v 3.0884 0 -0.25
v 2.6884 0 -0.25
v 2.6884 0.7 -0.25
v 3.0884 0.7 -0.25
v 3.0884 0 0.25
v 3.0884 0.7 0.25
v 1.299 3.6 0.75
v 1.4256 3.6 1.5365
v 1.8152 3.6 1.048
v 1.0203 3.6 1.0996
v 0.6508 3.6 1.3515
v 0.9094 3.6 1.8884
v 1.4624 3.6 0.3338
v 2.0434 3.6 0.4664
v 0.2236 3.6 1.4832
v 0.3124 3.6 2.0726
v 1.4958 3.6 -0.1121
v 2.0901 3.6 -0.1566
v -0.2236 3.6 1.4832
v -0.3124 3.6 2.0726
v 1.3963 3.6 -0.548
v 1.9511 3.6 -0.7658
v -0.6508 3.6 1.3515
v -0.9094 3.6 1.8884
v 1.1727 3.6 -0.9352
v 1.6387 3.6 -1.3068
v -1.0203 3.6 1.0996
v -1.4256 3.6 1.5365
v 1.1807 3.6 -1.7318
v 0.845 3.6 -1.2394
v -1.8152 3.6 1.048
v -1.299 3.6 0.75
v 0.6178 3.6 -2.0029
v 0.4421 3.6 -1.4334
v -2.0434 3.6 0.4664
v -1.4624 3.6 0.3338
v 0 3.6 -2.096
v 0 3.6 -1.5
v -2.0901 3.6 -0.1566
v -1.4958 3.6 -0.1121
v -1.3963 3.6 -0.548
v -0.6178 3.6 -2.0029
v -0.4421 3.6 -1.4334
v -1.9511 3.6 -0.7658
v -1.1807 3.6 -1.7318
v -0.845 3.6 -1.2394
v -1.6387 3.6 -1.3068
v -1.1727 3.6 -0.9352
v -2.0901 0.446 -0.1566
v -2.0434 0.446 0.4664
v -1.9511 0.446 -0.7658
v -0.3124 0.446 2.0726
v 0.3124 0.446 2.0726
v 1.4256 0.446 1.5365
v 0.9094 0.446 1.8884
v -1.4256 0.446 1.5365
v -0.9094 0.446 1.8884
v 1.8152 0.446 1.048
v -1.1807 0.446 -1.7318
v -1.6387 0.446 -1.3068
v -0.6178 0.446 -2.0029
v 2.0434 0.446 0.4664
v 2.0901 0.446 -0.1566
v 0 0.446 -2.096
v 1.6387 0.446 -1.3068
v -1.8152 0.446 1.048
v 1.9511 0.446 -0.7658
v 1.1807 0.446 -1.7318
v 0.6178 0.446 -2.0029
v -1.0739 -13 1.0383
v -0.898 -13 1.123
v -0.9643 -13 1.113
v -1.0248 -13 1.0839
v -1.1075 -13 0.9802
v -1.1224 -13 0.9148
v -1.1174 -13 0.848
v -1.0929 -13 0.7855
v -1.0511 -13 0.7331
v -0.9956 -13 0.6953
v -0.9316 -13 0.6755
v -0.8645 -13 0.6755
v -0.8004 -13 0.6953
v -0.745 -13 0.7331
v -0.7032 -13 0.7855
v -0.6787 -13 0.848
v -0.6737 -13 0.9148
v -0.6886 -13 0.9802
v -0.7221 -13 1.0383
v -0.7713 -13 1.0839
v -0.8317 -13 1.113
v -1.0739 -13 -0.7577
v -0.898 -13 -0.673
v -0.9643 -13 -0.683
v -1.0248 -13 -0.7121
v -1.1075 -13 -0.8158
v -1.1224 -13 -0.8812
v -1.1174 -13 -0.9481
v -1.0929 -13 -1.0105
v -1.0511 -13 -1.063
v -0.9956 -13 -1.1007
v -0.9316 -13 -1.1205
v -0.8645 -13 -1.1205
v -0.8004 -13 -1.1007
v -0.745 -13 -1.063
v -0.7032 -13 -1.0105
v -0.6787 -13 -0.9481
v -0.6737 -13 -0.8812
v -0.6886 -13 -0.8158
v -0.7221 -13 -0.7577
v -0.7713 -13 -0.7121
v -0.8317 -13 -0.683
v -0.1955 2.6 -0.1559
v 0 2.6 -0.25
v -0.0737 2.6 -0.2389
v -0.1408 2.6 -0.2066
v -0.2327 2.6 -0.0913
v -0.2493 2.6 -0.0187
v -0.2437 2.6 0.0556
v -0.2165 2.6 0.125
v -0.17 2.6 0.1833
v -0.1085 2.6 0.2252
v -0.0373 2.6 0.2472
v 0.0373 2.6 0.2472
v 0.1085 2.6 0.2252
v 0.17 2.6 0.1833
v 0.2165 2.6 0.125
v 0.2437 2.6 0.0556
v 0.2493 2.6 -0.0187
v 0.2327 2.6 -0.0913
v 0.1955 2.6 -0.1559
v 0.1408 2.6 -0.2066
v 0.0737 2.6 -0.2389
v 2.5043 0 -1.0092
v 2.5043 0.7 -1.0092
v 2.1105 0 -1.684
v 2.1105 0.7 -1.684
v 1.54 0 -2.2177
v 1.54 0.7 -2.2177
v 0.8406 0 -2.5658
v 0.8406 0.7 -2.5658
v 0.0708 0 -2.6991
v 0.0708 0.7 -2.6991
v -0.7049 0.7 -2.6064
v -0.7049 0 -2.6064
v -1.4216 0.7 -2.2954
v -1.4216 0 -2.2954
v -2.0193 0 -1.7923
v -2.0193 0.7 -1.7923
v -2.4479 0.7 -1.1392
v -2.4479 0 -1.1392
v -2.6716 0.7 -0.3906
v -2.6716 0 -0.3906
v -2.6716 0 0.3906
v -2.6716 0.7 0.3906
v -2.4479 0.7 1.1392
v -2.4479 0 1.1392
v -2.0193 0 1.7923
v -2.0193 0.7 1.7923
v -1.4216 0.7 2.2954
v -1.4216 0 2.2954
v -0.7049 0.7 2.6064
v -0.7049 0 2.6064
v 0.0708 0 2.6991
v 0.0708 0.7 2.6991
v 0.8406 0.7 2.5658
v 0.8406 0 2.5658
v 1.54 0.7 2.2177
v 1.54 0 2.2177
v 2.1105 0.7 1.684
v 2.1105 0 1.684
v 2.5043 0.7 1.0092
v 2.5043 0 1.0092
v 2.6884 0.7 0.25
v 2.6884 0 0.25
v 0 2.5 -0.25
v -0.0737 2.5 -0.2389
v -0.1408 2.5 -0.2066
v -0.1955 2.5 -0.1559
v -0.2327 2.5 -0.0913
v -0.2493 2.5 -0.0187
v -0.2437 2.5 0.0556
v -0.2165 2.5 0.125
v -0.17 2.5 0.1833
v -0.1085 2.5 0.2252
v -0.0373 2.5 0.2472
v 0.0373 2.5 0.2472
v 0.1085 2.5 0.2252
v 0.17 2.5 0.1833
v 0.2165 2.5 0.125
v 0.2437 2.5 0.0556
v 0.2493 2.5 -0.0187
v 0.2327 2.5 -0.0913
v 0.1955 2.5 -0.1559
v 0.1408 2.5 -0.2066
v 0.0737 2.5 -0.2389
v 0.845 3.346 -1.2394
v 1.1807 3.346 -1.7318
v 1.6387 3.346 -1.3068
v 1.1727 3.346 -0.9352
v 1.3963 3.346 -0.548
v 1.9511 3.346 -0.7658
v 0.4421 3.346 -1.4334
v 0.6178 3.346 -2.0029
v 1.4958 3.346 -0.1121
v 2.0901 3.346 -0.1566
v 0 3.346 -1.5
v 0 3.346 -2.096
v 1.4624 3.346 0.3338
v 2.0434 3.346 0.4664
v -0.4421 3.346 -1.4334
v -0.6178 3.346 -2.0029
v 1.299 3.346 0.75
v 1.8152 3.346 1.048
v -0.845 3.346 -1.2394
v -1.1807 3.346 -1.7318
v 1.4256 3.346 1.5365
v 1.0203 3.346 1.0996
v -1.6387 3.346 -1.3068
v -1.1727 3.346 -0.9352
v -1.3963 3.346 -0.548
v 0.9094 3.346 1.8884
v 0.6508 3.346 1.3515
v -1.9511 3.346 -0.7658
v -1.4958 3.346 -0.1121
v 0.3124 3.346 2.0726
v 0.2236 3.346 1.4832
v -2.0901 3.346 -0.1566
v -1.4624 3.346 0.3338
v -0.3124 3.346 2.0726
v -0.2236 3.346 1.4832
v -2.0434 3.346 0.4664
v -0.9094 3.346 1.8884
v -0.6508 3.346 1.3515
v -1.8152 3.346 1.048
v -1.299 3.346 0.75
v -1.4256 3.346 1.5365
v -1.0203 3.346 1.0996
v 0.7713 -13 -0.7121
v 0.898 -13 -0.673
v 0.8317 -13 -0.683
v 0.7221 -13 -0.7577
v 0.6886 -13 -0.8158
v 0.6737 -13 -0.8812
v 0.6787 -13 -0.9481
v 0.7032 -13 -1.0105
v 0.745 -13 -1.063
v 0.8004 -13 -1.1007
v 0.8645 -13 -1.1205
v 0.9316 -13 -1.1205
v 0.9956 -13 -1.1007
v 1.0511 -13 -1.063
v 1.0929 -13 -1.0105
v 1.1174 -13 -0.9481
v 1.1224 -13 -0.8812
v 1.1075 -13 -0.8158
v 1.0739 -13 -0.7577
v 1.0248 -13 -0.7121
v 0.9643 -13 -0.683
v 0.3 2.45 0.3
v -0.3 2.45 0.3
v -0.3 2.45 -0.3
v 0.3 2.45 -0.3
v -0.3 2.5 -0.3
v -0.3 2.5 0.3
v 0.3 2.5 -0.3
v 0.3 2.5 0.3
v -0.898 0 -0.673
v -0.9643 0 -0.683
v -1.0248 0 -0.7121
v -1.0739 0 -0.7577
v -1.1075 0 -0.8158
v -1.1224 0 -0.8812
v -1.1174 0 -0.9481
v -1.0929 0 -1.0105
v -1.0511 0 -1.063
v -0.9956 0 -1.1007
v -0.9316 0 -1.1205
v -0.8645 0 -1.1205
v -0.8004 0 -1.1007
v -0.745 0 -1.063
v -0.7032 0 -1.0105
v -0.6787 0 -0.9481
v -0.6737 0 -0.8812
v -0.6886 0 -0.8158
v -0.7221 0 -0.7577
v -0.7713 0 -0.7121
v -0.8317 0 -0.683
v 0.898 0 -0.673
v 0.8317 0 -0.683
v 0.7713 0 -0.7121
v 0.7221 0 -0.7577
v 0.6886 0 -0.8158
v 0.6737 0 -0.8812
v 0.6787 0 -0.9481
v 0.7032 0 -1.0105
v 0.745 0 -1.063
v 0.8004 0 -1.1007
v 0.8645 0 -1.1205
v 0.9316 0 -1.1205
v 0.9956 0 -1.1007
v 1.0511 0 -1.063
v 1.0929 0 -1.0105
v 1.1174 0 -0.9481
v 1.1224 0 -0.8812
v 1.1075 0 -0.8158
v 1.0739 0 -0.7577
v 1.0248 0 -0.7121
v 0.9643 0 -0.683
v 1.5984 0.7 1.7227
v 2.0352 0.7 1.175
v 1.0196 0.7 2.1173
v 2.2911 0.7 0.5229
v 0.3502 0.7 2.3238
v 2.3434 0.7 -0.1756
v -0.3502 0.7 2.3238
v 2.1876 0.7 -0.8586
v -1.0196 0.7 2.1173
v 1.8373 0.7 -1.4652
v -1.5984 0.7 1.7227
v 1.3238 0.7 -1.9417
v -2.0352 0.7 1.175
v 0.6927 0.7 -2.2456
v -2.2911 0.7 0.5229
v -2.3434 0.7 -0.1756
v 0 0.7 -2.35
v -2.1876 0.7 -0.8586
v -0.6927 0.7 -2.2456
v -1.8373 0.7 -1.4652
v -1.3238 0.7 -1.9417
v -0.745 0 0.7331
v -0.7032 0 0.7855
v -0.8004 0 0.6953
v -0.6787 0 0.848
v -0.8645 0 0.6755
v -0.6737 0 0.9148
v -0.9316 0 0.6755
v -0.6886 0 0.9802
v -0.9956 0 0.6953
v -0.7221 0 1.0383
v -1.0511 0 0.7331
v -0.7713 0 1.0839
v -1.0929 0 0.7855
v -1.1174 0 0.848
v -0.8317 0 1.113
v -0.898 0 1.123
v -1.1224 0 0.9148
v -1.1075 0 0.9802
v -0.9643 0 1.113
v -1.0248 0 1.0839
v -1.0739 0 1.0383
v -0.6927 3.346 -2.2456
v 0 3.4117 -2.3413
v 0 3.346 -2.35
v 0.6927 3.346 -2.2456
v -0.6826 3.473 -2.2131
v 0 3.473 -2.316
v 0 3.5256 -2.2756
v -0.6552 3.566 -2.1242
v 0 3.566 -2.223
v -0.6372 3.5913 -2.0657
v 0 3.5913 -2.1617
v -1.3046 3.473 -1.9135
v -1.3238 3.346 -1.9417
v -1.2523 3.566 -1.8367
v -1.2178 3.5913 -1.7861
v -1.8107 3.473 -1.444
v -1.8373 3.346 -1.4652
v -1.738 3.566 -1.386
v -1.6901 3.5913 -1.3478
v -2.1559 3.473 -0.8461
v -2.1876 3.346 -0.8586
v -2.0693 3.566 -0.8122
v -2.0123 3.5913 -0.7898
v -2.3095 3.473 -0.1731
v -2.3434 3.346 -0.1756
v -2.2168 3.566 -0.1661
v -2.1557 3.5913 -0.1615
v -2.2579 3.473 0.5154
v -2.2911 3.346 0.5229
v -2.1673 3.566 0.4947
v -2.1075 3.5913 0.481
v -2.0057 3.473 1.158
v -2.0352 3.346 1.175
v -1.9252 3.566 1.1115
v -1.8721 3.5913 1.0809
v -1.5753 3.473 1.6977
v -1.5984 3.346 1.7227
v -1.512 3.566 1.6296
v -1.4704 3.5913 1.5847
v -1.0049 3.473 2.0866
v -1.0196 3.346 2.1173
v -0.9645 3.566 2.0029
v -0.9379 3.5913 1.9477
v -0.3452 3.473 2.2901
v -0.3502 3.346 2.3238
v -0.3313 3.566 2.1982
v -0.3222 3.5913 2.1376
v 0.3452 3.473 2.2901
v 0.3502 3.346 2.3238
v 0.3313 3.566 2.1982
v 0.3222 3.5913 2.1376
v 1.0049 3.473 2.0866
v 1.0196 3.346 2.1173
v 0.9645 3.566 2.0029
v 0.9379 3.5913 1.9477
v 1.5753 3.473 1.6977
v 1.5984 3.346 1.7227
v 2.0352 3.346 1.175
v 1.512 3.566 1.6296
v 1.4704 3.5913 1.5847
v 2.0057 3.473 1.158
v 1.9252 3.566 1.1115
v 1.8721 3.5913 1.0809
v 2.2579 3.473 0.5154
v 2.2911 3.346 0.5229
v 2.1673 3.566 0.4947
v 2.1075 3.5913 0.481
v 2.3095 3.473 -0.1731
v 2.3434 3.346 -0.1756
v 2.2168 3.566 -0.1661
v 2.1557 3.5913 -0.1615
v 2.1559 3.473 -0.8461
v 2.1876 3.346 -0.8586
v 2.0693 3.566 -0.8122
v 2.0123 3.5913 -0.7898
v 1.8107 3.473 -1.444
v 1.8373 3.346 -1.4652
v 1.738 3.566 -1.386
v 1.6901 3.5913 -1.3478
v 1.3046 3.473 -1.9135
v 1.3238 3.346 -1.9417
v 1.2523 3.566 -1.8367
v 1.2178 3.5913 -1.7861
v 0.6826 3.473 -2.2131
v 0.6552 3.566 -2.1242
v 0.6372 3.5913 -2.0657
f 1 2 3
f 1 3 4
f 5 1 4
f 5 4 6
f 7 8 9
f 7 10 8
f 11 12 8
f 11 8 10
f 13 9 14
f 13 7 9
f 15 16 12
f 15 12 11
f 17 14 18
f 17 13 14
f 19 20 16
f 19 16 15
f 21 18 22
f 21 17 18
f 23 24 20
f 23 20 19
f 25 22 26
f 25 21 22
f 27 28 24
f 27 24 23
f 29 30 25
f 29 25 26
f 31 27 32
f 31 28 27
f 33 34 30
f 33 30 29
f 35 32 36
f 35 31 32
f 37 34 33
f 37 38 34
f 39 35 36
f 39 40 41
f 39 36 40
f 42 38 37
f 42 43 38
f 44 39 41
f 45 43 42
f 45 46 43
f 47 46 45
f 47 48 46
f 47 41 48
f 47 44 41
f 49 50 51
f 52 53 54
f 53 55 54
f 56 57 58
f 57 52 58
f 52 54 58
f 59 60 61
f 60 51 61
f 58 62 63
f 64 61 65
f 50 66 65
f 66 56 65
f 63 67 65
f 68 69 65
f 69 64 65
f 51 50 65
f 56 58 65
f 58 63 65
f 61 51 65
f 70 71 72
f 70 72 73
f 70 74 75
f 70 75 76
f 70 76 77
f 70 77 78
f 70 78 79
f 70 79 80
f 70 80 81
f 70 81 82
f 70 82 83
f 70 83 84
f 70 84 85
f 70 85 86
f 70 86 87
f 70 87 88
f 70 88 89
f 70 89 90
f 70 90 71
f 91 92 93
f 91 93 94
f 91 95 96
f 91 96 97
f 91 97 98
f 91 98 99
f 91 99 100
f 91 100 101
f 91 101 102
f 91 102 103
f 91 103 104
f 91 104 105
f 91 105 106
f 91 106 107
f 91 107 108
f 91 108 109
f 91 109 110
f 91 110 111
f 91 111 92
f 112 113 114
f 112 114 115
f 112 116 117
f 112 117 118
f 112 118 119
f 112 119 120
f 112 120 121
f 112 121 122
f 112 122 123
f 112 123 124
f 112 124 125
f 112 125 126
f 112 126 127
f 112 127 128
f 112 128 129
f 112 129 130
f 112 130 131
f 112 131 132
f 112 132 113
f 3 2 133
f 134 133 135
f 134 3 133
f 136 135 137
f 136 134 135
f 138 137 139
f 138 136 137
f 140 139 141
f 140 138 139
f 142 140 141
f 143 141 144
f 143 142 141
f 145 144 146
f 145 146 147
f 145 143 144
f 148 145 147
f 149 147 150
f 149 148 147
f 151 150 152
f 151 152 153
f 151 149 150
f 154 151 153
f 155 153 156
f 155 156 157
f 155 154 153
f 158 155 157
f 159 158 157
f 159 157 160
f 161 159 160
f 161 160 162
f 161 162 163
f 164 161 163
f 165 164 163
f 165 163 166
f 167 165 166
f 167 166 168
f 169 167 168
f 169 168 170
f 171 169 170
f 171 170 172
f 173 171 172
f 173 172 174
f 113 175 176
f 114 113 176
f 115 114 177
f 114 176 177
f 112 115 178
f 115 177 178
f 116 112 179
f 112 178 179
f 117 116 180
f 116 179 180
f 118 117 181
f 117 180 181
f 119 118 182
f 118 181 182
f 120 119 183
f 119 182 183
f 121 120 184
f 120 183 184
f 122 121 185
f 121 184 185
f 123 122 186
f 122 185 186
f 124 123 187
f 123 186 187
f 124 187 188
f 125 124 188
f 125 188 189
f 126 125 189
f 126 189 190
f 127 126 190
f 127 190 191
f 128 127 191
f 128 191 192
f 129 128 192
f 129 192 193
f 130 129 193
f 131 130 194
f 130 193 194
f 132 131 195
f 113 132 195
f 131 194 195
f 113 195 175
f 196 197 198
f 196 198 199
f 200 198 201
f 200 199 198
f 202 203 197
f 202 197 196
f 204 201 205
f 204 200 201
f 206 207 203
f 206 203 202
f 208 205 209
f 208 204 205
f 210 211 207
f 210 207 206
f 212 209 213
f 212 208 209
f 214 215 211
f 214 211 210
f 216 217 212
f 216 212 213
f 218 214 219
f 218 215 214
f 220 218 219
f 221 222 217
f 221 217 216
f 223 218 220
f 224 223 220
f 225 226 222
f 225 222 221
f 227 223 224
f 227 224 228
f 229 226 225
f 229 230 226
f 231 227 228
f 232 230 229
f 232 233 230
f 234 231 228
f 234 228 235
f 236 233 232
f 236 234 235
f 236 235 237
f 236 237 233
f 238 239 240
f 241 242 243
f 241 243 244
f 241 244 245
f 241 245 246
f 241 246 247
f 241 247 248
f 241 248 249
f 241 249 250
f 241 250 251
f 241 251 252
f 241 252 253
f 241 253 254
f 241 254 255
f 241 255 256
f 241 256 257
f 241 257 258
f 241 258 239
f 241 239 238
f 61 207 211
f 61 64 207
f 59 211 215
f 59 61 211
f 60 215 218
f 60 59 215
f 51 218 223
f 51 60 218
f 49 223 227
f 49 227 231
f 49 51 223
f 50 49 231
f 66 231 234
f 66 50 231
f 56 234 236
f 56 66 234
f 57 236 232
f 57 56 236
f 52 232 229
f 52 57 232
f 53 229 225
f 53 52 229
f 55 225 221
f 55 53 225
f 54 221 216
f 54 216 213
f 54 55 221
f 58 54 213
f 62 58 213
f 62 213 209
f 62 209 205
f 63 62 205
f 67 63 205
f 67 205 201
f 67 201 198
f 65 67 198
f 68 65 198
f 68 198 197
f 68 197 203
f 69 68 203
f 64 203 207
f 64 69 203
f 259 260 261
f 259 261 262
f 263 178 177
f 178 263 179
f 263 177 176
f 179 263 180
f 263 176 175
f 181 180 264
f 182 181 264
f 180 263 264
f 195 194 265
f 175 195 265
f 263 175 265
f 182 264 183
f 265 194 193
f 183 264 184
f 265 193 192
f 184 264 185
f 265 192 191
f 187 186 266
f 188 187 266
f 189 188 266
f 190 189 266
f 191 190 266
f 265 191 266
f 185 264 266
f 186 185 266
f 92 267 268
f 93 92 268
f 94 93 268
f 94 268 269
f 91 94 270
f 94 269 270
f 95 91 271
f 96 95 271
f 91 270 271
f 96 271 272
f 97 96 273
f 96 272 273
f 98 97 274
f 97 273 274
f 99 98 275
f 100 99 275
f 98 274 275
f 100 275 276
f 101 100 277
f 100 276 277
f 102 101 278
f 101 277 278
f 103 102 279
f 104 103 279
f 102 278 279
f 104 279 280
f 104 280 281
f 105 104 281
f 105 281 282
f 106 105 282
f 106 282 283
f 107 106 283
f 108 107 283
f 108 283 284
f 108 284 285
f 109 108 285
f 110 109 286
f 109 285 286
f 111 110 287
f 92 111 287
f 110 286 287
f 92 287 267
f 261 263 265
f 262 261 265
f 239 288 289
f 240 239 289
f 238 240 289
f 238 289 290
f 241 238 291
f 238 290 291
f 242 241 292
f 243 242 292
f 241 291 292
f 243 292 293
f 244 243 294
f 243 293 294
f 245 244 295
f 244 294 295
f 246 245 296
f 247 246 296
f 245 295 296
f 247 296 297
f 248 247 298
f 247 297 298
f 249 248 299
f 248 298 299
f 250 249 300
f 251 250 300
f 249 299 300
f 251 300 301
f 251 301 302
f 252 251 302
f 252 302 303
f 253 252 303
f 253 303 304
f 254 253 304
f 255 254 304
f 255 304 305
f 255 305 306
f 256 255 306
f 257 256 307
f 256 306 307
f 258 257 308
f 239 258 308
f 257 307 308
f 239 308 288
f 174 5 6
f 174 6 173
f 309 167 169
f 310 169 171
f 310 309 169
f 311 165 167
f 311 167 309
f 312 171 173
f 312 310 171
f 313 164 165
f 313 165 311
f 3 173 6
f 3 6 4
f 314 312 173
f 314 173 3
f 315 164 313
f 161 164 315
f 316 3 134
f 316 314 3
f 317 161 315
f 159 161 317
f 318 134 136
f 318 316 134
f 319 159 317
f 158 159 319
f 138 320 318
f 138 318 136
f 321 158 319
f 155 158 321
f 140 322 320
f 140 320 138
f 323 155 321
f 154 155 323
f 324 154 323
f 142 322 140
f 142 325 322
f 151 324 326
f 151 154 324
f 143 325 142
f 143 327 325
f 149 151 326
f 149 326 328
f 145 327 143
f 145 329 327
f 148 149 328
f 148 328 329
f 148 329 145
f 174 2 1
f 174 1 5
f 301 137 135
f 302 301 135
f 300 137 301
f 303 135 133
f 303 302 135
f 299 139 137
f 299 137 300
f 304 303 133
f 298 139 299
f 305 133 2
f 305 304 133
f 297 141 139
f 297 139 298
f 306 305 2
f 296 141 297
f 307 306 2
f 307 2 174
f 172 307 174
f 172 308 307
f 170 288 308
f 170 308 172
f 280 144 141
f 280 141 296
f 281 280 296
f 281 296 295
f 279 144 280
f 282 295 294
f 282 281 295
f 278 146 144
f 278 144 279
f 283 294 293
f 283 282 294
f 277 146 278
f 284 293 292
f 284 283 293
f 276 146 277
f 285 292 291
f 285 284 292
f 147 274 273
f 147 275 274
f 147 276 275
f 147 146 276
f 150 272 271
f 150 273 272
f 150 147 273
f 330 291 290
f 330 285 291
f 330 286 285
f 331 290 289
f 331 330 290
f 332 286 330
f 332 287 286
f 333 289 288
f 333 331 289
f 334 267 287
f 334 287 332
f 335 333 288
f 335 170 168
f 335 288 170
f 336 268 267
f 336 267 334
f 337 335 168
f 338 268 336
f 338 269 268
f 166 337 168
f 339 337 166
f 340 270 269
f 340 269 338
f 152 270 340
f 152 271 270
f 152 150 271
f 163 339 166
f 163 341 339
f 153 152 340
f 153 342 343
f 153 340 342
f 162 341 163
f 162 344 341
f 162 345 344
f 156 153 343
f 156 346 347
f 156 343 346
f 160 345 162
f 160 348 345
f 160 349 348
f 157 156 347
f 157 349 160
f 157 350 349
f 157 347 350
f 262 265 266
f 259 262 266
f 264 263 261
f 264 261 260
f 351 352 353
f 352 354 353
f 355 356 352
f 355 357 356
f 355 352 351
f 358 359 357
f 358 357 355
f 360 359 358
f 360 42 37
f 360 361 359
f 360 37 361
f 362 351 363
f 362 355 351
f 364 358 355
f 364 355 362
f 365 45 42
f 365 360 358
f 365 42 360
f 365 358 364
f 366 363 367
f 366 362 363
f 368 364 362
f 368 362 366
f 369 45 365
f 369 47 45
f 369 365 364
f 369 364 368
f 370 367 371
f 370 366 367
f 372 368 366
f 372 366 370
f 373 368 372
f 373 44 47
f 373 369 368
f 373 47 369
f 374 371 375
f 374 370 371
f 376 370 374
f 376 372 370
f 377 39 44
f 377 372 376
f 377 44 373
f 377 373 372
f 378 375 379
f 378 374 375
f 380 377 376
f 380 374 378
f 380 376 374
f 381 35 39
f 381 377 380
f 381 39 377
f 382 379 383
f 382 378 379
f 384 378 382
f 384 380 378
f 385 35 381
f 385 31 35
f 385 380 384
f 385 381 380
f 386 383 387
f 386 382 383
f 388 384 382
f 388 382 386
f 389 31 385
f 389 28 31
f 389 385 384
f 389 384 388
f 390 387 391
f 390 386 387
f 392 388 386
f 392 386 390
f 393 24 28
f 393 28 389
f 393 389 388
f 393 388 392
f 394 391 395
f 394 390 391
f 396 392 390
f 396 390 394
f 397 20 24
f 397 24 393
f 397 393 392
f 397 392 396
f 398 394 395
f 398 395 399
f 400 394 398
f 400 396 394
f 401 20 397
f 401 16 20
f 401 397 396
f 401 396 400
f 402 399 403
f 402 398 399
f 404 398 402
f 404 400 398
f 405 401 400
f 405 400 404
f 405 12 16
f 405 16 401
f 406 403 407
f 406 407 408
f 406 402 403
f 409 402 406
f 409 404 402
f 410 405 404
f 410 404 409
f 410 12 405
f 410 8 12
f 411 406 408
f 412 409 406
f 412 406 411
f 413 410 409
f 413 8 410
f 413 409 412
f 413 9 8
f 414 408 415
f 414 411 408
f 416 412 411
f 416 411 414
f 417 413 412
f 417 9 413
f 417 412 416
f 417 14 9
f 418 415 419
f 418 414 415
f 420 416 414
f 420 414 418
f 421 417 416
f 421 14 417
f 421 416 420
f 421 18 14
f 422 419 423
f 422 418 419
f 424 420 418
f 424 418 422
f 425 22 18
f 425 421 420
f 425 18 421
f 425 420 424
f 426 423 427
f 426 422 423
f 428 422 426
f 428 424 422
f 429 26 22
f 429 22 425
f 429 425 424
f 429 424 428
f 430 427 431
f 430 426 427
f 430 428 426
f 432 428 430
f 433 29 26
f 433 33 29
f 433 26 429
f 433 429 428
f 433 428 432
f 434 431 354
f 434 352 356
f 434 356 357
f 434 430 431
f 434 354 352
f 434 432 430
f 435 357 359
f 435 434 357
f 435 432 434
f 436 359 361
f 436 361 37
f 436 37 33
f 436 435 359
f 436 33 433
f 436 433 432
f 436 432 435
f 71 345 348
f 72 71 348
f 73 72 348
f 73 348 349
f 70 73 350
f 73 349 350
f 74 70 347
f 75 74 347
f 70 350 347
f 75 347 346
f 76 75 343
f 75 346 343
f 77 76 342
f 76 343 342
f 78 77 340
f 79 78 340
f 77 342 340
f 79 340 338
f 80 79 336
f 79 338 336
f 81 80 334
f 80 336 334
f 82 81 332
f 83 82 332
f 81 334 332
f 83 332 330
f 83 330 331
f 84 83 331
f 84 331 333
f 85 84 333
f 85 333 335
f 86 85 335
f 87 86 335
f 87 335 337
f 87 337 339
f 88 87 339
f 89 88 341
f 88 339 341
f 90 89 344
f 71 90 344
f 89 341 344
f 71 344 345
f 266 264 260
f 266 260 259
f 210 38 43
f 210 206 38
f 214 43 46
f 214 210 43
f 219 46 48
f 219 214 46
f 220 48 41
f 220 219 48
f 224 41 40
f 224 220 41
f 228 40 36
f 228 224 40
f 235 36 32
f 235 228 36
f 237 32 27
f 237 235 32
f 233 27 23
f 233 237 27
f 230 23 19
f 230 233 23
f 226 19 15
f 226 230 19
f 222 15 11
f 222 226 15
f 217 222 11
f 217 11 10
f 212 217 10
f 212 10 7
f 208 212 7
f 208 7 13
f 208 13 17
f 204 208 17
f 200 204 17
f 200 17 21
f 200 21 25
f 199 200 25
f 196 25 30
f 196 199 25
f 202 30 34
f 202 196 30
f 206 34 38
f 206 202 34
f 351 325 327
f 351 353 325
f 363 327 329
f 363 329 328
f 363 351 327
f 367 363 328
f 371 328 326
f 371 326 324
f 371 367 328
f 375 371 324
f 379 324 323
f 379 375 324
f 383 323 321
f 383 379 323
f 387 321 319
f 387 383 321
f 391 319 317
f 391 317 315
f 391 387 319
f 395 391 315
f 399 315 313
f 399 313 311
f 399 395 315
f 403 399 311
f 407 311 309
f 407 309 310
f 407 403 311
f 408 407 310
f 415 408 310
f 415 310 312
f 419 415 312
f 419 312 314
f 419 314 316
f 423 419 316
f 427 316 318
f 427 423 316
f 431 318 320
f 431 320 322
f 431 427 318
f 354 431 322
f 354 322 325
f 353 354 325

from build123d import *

# Parameters (mm, degrees)
SKETCH2_R           = 2.7
BOSS_EXTRUDE1_DEPTH = 0.446
BOSS_EXTRUDE2_START = -2.5
SKETCH3_W           = 0.6
SKETCH3_H           = 0.6
BOSS_EXTRUDE2_DEPTH = 0.05
SKETCH8_R           = 0.25
BOSS_EXTRUDE6_DEPTH = 0.1
BOSS_EXTRUDE8_DEPTH = 0.7
SKETCH5_R           = 0.225
BOSS_EXTRUDE4_DEPTH = 13


with BuildPart() as part:
    # Sketch1 → Revolve-Thin2 (revolve)
    with BuildSketch(Plane.XY, mode=Mode.PRIVATE) as revolve_thin2_sk:
        with BuildLine():
            Line((2.7, 0), (2.7, 0.7))
            Line((2.7, 0.7), (2.35, 0.7))
            Line((2.35, 0.7), (2.35, 3.346))
            ThreePointArc((2.35, 3.346), (2.275605122, 3.525605122), (2.096, 3.6))
            Line((2.096, 3.6), (1.5, 3.6))
            Line((1.5, 3.6), (1.5, 3.346))
            Line((1.5, 3.346), (2.096, 3.346))
            Line((2.096, 3.346), (2.096, 0.446))
            Line((2.096, 0.446), (2.446, 0.446))
            Line((2.446, 0.446), (2.446, 0))
            Line((2.446, 0), (2.7, 0))
        make_face()
    revolve(revolve_thin2_sk.sketch.rotate(Axis((0, 0, 0), (0, 1, 0)), 90), axis=Axis((0, 0, 0), (0, 1, 0)))  # turned: the seam where the file's is

    # Sketch2 → Boss-Extrude1 (add)
    with BuildSketch(Plane.XZ):
        with Locations(Location((0, 0, 0), (0, 0, 270))):  # turned: the seam where the file's is
            Circle(SKETCH2_R)
    extrude(amount=-BOSS_EXTRUDE1_DEPTH)

    # Sketch11 → Boss-Extrude8 (add)
    with BuildSketch(Plane.XZ):
        with BuildLine():
            Line((3.088401012, -0.25), (3.088401012, 0))
            Line((3.088401012, 0), (3.088401012, 0.25))
            Line((3.088401012, 0.25), (2.688401012, 0.25))
            ThreePointArc((2.688401012, 0.25), (2.697098694, 0.125134464), (2.7, 0))
            ThreePointArc((2.7, 0), (2.697098694, -0.125134464), (2.688401012, -0.25))
            Line((2.688401012, -0.25), (3.088401012, -0.25))
        make_face()
    extrude(amount=-BOSS_EXTRUDE8_DEPTH)

    # Sketch5 → Boss-Extrude4 (add)
    with BuildSketch(Plane.XZ):
        with Locations(Location((0.898025612, -0.898025612, 0), (0, 0, 90))):  # turned: the seam where the file's is
            Circle(SKETCH5_R)
        with Locations(Location((-0.898025612, 0.898025612, 0), (0, 0, 90))):  # turned: the seam where the file's is
            Circle(SKETCH5_R)
        with Locations(Location((-0.898025612, -0.898025612, 0), (0, 0, 90))):  # turned: the seam where the file's is
            Circle(SKETCH5_R)
    extrude(amount=BOSS_EXTRUDE4_DEPTH)


with BuildPart() as body_2:
    # Sketch3 → Boss-Extrude2 (new body)
    with BuildSketch(Plane.XZ.offset(BOSS_EXTRUDE2_START)):
        Rectangle(SKETCH3_W, SKETCH3_H)
    extrude(amount=BOSS_EXTRUDE2_DEPTH)

    # Sketch8 → Boss-Extrude6 (add)
    with BuildSketch(Plane(origin=(0, 2.5, 0), x_dir=(-1, 0, 0), z_dir=(0, 1, 0))):
        with Locations(Location((0, 0, 0), (0, 0, 270))):  # turned: the seam where the file's is
            Circle(SKETCH8_R)
    extrude(amount=BOSS_EXTRUDE6_DEPTH)


solid = Compound([part.part, body_2.part])
